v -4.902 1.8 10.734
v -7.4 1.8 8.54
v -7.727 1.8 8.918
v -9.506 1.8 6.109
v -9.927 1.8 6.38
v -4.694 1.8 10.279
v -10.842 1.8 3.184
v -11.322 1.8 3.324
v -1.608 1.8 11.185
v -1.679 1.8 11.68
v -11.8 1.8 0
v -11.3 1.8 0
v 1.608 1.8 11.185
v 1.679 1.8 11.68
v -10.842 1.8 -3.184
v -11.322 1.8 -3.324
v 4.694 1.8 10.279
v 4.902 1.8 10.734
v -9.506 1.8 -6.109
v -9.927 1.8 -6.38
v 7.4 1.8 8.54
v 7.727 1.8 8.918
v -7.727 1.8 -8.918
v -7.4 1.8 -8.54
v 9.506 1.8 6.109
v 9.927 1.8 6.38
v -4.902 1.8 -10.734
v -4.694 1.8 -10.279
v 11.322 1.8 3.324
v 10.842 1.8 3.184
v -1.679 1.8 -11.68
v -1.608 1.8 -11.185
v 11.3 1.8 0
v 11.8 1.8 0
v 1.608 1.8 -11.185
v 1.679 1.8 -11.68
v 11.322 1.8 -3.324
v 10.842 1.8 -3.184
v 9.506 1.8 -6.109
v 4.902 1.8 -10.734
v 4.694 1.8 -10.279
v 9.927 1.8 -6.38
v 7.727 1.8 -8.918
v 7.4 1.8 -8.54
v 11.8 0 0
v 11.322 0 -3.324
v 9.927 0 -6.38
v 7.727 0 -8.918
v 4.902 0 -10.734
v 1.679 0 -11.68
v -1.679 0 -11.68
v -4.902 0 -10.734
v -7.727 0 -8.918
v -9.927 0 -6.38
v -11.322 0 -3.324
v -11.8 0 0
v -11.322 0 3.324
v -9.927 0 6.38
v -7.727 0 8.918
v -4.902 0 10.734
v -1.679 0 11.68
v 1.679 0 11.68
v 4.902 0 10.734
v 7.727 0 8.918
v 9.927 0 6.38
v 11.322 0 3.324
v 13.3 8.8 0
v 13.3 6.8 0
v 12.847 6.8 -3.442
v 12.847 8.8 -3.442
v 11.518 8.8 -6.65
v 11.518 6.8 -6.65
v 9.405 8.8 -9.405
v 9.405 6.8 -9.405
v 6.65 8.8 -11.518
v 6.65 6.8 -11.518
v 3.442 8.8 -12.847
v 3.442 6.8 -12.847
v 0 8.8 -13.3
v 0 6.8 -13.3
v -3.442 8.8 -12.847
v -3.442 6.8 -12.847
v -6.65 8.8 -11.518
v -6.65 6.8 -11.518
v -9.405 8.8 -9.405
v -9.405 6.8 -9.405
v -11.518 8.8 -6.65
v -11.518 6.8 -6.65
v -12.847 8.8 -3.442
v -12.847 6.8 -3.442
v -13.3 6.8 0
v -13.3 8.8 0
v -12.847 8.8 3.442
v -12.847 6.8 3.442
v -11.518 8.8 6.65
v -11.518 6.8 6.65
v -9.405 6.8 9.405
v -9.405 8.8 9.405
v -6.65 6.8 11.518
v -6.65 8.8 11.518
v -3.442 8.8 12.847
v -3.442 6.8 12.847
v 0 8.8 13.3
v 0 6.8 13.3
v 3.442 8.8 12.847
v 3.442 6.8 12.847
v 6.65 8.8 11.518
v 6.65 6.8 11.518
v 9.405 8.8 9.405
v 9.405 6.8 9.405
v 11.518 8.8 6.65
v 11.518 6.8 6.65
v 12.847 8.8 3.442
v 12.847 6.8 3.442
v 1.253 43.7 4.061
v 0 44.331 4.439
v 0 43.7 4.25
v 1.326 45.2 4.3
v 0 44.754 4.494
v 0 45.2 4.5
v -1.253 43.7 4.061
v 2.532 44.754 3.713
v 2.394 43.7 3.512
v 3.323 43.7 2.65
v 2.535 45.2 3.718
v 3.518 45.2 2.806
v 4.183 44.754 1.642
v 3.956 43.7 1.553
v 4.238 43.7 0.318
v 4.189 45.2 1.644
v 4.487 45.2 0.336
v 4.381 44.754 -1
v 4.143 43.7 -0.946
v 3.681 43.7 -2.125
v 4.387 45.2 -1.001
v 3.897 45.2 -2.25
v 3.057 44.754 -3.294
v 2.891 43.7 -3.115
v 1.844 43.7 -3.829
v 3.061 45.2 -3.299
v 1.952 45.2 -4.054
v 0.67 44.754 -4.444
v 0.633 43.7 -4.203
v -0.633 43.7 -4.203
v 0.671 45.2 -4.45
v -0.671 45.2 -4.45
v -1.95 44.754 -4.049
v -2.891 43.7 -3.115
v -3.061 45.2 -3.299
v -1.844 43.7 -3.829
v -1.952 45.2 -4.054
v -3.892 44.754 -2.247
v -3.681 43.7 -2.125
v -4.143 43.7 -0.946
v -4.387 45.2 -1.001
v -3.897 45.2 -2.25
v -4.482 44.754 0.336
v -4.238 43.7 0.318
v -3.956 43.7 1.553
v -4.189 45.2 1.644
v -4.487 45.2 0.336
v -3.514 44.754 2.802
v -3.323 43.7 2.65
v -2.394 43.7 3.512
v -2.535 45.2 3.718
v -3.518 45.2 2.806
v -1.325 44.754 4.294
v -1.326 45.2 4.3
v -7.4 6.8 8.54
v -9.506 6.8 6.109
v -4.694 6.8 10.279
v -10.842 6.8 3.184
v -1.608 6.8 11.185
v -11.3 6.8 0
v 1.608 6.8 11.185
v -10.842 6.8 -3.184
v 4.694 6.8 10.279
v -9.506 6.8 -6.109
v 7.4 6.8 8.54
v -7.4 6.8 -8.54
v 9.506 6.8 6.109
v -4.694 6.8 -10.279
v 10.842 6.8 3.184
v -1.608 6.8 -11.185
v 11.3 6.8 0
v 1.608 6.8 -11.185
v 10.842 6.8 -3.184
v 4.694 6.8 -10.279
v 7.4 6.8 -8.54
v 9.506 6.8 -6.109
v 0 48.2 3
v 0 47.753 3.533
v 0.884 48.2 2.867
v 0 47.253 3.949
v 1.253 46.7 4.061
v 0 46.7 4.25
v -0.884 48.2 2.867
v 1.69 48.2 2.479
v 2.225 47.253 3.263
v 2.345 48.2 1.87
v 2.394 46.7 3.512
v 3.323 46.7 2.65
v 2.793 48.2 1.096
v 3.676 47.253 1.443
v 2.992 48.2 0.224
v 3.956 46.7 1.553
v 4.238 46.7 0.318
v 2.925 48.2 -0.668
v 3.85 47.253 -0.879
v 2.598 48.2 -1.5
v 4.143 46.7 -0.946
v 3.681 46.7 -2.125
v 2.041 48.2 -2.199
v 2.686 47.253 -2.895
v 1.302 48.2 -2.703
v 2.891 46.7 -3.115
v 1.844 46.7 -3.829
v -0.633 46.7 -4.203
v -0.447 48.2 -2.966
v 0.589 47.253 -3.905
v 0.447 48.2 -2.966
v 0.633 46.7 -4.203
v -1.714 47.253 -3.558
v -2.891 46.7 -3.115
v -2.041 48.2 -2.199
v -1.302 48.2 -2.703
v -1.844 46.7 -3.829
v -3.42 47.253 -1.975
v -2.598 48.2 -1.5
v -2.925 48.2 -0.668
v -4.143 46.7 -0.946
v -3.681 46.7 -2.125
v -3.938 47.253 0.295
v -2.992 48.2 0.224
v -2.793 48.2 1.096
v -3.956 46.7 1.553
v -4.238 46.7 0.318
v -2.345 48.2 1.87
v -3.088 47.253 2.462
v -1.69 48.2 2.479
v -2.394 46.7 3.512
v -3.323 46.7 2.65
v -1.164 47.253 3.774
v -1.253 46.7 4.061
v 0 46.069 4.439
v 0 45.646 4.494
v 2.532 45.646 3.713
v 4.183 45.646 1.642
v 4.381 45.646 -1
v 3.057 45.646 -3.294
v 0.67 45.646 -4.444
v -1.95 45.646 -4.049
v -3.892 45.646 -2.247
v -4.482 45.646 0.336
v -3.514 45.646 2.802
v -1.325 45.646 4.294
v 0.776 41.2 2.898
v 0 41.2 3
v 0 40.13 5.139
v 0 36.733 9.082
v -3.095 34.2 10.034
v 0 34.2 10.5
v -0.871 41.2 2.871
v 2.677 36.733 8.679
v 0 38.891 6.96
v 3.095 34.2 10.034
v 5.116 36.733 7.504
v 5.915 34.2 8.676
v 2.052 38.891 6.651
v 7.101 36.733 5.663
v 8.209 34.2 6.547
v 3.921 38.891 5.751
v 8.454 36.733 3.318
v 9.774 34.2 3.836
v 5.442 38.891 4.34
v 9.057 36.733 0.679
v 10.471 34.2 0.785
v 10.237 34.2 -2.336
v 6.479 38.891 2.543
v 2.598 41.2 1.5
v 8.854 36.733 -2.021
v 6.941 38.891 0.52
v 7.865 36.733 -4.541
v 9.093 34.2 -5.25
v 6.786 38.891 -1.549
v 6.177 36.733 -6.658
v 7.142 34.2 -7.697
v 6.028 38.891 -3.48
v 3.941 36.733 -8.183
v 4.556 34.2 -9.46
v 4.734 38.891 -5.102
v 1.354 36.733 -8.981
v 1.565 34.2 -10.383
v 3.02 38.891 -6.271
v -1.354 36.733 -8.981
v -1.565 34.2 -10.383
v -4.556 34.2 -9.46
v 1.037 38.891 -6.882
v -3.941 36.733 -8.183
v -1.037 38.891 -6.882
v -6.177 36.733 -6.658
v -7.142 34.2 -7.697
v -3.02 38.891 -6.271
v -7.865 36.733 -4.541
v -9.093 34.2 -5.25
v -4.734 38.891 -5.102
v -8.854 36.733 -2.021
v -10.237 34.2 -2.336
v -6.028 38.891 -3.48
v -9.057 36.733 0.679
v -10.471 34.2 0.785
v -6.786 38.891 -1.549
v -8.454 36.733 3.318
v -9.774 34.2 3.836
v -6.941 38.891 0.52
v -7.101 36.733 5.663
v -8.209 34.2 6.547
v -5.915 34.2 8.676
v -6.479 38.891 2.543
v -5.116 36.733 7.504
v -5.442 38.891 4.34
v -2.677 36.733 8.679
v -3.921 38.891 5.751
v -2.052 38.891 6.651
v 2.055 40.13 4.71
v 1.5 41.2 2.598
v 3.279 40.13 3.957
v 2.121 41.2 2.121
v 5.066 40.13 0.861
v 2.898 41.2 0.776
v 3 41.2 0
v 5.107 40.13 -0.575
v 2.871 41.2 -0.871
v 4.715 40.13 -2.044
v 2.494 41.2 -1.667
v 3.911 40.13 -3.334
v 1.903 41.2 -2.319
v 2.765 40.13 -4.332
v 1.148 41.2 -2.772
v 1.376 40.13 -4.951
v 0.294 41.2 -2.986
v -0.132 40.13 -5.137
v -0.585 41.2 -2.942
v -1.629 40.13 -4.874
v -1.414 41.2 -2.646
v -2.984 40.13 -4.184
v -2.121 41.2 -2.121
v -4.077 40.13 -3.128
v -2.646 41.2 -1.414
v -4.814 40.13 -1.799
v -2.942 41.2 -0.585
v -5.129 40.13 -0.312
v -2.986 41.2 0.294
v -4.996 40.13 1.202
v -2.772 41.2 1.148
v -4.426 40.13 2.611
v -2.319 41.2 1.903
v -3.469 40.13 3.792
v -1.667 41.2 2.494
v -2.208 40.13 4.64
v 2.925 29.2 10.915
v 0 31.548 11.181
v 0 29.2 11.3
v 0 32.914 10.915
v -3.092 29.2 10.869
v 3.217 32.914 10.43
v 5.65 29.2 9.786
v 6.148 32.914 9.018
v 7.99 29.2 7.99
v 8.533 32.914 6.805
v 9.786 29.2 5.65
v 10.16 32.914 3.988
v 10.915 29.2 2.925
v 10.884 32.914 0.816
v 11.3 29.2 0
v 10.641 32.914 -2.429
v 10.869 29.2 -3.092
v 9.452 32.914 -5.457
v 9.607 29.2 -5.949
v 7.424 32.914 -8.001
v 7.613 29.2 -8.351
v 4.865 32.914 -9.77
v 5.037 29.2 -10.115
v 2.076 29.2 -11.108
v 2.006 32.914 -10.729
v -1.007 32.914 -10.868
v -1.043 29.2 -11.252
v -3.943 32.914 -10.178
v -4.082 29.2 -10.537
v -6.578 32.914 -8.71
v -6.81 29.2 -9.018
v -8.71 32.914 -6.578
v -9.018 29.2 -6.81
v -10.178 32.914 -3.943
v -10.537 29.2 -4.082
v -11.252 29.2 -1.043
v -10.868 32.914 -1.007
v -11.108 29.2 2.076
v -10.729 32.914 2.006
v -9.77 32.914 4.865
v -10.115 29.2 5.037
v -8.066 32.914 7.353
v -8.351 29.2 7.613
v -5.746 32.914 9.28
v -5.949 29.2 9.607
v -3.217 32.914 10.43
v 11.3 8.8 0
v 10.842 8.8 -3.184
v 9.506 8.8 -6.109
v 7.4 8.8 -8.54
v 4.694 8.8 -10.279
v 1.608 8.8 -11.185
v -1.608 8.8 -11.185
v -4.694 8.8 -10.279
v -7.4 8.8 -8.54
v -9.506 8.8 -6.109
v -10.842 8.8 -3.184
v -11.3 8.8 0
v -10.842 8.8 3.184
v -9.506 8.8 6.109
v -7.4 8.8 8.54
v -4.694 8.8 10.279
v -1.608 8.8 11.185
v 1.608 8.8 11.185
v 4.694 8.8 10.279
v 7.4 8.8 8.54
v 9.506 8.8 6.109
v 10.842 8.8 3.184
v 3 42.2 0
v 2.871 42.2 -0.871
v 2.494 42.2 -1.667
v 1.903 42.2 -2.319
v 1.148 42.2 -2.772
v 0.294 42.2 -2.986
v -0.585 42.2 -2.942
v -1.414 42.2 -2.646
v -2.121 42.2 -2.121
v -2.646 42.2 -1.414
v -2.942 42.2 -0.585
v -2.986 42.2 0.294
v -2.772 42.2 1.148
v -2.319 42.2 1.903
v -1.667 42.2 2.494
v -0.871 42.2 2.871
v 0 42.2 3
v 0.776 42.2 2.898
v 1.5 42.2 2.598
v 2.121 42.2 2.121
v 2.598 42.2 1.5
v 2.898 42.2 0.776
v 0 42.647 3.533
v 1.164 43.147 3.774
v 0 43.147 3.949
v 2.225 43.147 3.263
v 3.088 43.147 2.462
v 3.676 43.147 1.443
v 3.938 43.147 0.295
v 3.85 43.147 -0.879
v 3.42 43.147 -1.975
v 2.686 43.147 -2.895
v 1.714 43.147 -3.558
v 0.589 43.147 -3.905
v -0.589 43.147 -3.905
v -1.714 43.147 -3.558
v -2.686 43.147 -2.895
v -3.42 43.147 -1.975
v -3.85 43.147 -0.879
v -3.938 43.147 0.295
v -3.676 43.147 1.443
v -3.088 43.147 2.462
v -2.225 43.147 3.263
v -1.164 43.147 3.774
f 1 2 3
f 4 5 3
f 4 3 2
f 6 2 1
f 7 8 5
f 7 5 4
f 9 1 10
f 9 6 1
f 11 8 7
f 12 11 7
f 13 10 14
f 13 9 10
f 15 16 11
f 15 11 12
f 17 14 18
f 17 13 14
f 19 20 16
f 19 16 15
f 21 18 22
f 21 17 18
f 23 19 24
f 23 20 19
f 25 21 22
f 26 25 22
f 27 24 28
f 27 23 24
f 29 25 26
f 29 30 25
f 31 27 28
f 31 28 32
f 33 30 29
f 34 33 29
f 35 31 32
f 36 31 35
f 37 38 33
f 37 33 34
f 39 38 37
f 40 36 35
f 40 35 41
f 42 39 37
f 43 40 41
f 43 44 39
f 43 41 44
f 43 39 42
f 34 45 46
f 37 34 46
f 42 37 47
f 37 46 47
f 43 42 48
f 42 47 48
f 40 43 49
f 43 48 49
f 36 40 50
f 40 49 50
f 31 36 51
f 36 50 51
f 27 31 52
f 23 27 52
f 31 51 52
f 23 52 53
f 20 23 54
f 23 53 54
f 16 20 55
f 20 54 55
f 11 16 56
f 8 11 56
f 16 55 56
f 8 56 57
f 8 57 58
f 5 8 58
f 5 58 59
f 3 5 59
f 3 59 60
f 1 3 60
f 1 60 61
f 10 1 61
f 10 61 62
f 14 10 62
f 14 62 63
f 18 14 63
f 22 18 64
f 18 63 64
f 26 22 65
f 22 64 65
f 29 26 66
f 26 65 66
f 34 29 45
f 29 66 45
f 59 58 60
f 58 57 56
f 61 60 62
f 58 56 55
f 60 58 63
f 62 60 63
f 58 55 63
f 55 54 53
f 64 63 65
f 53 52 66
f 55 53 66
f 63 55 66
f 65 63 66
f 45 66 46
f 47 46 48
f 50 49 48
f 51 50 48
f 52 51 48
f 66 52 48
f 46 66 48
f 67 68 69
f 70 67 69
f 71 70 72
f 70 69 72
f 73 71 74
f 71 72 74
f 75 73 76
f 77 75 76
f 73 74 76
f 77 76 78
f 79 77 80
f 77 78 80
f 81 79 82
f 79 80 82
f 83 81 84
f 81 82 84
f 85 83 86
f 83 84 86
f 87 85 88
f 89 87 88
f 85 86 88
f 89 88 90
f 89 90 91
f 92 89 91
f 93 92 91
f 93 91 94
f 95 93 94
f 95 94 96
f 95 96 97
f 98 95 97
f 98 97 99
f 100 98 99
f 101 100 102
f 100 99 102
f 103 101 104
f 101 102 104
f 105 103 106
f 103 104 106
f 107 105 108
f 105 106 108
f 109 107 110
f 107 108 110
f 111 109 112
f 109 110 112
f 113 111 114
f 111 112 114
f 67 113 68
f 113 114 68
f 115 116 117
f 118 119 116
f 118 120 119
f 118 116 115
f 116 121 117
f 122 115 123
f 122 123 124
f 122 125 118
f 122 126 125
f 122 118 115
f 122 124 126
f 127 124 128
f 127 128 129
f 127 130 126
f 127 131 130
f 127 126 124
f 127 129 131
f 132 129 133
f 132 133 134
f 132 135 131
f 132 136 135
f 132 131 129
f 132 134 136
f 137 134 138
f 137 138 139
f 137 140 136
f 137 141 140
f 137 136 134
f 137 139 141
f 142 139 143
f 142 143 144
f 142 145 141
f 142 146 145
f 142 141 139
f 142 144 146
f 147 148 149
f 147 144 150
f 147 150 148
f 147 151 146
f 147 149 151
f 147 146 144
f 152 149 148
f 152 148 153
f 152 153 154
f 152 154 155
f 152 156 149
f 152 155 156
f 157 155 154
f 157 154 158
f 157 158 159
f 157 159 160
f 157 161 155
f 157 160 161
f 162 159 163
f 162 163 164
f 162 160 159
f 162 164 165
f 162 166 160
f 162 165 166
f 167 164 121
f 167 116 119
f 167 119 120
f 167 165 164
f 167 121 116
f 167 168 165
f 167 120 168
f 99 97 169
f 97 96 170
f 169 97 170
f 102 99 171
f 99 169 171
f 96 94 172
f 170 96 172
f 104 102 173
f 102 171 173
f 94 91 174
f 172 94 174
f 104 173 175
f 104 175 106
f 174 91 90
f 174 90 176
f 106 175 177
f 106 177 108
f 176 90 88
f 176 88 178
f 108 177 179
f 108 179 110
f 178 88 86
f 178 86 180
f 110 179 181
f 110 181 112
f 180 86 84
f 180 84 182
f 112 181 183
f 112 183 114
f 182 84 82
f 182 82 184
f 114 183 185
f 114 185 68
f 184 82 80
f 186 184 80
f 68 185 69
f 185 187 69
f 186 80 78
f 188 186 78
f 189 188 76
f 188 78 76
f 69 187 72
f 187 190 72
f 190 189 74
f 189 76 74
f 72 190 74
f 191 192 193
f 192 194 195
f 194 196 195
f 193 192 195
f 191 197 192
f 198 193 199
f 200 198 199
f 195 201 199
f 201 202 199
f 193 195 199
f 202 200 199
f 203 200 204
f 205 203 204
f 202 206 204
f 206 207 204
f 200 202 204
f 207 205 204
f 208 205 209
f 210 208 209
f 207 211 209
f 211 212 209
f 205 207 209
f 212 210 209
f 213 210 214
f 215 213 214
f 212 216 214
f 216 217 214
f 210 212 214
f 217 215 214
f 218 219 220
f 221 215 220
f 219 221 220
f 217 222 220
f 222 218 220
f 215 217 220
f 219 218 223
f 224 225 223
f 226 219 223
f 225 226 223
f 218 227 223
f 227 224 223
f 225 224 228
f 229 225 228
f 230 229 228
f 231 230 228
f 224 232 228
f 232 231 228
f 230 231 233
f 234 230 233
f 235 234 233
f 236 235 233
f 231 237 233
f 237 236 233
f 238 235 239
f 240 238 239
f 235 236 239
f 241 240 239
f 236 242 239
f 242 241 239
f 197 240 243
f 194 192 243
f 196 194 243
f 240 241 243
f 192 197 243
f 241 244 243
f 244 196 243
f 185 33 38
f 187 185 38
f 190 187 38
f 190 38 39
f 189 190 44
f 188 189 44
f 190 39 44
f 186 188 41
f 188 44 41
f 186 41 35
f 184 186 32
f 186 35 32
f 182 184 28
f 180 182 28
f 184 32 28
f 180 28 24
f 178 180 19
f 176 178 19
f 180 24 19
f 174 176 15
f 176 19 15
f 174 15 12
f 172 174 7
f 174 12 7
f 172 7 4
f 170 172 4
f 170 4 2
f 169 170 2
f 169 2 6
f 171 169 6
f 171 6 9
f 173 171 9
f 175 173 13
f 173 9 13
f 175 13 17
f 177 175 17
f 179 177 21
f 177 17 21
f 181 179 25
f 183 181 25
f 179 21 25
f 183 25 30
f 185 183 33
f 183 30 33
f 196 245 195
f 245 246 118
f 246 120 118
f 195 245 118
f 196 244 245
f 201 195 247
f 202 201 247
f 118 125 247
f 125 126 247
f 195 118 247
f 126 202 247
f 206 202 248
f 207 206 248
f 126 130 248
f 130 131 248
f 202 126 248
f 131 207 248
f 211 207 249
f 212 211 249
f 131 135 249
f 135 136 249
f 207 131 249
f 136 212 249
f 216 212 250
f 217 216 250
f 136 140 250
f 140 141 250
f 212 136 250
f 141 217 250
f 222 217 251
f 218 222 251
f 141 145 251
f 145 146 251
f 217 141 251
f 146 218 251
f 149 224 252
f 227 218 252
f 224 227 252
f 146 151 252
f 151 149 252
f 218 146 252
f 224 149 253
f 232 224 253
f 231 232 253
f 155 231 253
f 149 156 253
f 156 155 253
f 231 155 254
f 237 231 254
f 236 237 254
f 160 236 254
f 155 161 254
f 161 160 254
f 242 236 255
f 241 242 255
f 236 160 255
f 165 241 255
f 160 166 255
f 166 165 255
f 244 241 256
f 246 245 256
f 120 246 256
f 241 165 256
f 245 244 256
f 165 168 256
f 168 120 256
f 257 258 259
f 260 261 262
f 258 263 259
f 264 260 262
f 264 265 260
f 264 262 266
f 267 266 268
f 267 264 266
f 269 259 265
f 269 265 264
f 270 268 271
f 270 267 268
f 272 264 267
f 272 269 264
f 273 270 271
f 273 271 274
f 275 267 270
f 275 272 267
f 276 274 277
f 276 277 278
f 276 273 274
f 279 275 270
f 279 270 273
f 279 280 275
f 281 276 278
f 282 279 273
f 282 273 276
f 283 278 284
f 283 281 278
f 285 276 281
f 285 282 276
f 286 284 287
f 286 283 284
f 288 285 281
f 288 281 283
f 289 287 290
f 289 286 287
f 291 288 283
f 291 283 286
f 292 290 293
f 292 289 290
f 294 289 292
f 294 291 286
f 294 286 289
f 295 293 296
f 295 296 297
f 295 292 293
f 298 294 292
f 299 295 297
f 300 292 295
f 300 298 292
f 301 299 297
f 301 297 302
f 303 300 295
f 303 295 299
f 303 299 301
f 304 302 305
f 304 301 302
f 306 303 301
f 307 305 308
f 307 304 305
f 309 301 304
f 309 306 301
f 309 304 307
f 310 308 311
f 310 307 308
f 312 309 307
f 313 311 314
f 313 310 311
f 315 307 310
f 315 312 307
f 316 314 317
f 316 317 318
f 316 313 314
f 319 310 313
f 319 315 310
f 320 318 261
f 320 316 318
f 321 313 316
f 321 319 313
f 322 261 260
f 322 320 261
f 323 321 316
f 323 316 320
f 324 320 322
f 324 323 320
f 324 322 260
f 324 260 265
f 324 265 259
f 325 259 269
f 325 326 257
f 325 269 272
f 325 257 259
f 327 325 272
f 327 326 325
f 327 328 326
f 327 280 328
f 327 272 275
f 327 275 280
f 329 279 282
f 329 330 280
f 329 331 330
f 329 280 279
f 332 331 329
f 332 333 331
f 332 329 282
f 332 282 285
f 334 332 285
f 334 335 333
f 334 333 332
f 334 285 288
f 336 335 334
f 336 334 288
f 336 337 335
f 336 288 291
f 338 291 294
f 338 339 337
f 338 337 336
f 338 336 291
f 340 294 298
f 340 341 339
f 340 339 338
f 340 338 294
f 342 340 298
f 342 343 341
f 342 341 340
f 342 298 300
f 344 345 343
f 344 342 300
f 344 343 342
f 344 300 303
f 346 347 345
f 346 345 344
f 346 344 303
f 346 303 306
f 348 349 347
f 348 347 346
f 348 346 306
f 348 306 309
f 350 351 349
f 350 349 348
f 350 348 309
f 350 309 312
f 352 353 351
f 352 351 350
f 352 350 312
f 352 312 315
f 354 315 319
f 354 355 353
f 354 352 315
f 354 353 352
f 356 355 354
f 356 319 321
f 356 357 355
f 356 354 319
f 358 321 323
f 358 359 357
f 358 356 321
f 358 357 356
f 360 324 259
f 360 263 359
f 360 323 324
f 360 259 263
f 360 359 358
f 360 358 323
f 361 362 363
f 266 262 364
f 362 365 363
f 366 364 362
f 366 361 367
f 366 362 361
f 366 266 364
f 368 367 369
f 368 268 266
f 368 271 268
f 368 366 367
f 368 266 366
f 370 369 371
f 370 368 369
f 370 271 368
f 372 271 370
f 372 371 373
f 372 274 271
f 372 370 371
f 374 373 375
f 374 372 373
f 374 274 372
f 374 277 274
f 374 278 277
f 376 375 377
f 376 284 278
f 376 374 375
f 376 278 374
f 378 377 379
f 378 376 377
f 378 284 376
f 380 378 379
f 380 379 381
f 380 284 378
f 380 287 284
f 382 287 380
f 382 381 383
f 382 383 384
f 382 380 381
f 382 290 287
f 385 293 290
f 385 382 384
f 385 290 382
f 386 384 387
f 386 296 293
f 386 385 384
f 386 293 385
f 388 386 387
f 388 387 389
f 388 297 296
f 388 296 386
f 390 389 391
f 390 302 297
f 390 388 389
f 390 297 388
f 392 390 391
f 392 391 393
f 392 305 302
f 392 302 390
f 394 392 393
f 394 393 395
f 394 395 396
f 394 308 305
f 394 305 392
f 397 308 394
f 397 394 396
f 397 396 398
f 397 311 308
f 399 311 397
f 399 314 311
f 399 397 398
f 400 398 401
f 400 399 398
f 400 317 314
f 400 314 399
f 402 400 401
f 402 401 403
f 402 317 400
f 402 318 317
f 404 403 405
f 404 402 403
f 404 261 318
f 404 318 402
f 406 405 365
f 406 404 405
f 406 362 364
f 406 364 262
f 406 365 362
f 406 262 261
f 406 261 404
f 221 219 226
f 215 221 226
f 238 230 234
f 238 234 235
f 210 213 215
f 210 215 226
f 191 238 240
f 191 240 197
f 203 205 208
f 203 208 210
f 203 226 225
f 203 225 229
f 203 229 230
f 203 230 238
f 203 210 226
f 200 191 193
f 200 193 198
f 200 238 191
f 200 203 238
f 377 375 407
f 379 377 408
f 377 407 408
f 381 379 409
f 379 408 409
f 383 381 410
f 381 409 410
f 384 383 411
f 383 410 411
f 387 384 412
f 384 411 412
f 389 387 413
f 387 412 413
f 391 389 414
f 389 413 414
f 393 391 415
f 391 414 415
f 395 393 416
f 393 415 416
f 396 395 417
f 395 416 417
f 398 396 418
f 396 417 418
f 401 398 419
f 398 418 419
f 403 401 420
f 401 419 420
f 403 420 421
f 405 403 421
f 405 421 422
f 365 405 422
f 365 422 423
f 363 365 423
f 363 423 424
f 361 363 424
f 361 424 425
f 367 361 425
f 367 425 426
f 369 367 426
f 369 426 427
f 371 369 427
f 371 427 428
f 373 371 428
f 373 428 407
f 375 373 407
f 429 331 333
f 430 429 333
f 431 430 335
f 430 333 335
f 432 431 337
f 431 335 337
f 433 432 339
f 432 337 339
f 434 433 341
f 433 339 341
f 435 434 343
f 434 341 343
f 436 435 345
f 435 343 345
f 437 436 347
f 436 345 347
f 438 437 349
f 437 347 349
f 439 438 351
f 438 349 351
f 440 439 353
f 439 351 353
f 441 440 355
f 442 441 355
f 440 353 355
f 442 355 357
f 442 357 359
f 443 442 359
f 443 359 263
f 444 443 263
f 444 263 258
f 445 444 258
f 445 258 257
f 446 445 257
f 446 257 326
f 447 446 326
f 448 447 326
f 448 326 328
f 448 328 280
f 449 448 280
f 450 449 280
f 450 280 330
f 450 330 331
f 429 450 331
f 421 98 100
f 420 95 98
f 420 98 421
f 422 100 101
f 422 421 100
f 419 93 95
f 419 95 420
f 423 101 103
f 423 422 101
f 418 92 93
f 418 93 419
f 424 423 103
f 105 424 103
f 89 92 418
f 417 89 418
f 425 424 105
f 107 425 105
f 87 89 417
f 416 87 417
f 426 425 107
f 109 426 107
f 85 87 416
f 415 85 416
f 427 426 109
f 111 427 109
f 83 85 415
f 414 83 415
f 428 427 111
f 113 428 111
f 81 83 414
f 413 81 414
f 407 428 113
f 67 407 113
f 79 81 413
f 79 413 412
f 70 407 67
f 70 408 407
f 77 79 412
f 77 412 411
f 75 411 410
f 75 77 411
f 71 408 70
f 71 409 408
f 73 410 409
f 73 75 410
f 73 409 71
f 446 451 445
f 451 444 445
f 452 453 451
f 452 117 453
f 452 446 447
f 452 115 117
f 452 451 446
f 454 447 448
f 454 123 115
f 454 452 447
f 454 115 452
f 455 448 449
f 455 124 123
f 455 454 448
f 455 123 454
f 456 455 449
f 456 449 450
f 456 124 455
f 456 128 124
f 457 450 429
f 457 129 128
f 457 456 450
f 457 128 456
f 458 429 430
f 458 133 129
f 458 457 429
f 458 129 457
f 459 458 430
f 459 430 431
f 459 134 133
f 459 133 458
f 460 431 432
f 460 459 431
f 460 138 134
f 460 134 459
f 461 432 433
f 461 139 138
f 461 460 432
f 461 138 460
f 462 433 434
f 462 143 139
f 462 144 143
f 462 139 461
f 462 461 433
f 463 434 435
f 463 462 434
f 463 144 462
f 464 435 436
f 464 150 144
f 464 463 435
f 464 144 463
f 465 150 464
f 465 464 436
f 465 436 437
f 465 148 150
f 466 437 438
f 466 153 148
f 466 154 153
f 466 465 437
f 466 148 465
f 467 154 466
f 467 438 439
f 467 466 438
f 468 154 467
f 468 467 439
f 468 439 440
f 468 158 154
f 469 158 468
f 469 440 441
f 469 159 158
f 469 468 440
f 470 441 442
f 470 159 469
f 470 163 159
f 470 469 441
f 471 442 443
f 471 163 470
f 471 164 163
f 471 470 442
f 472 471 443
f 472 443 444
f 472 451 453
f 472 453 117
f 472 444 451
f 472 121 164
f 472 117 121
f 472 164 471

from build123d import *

# Parameters (mm, degrees)
SKETCH1_R           = 11.8
BOSS_EXTRUDE1_DEPTH = 1.8
SKETCH2_R           = 11.3
BOSS_EXTRUDE2_DEPTH = 5
SKETCH3_R           = 13.3
BOSS_EXTRUDE3_DEPTH = 2
SKETCH4_R           = 11.3
BOSS_EXTRUDE4_DEPTH = 20.4
SKETCH6_R           = 3
BOSS_EXTRUDE5_DEPTH = 1


with BuildPart() as part:
    # Sketch1 → Boss-Extrude1 (new body)
    with BuildSketch(Plane(origin=(0, 0, 0), x_dir=(1, 0, 0), z_dir=(0, 1, 0))):
        Circle(SKETCH1_R)
    extrude(amount=BOSS_EXTRUDE1_DEPTH)

    # Sketch2 → Boss-Extrude2 (add)
    with BuildSketch(Plane(origin=(0, 1.8, 0), x_dir=(1, 0, 0), z_dir=(0, 1, 0))):
        Circle(SKETCH2_R)
    extrude(amount=BOSS_EXTRUDE2_DEPTH)

    # Sketch3 → Boss-Extrude3 (add)
    with BuildSketch(Plane(origin=(0, 6.8, 0), x_dir=(1, 0, 0), z_dir=(0, 1, 0))):
        Circle(SKETCH3_R)
    extrude(amount=BOSS_EXTRUDE3_DEPTH)

    # Sketch4 → Boss-Extrude4 (add)
    with BuildSketch(Plane(origin=(0, 8.8, 0), x_dir=(1, 0, 0), z_dir=(0, 1, 0))):
        Circle(SKETCH4_R)
    extrude(amount=BOSS_EXTRUDE4_DEPTH)

    # Sketch5 → Revolve1 (revolve)
    with BuildSketch(Plane(origin=(0, 0, 0), x_dir=(0, 0, -1), z_dir=(1, 0, 0))):
        with BuildLine():
            add(Edge.make_bspline(
                [(-10.5, 34.2), (-8.718155673, 38.74792404), (-3, 41.2)],
                knots=[0.330462847, 0.330462847, 0.330462847, 1, 1, 1], degree=2))
            Line((-10.5, 34.2), (0, 34.2))
            Line((0, 34.2), (0, 41.2))
            Line((0, 41.2), (-3, 41.2))
        make_face()
        with BuildLine():
            add(Edge.make_bspline(
                [(-11.3, 29.2), (-11.379463292, 31.955285248), (-10.5, 34.2)],
                knots=[0, 0, 0, 0.330462847, 0.330462847, 0.330462847], degree=2))
            Line((-11.3, 29.2), (0, 29.2))
            Line((0, 29.2), (0, 34.2))
            Line((0, 34.2), (-10.5, 34.2))
        make_face()
    revolve(axis=Axis((0, 29.2, 0), (0, 1, 0)))

    # Sketch6 → Boss-Extrude5 (add)
    with BuildSketch(Plane(origin=(0, 41.2, 0), x_dir=(1, 0, 0), z_dir=(0, 1, 0))):
        Circle(SKETCH6_R)
    extrude(amount=BOSS_EXTRUDE5_DEPTH)

    # Sketch7 → Revolve2 (revolve)
    with BuildSketch(Plane(origin=(0, 0, 0), x_dir=(0, 0, -1), z_dir=(1, 0, 0))):
        with BuildLine():
            Line((-4.25, 43.7), (0, 43.7))
            Line((0, 43.7), (0, 45.2))
            Line((0, 45.2), (-4.5, 45.2))
            add(Edge.make_bspline(
                [(-4.25, 43.7), (-4.53338952, 44.377370072), (-4.5, 45.2)],
                knots=[0.56217108, 0.56217108, 0.56217108, 1, 1, 1], degree=2))
        make_face()
        with BuildLine():
            Line((-3, 42.2), (0, 42.2))
            Line((0, 42.2), (0, 43.7))
            Line((0, 43.7), (-4.25, 43.7))
            add(Edge.make_bspline(
                [(-3, 42.2), (-3.886128668, 42.830258767), (-4.25, 43.7)],
                knots=[0, 0, 0, 0.56217108, 0.56217108, 0.56217108], degree=2))
        make_face()
    revolve2 = revolve(axis=Axis((0, 42.2, 0), (0, 1, 0)))

    # Mirror1: Revolve2 across plane
    add(revolve2.mirror(Plane(origin=(0, 45.2, 0), x_dir=(0, 0, 1), z_dir=(0, -1, 0))))


solid = part.part
